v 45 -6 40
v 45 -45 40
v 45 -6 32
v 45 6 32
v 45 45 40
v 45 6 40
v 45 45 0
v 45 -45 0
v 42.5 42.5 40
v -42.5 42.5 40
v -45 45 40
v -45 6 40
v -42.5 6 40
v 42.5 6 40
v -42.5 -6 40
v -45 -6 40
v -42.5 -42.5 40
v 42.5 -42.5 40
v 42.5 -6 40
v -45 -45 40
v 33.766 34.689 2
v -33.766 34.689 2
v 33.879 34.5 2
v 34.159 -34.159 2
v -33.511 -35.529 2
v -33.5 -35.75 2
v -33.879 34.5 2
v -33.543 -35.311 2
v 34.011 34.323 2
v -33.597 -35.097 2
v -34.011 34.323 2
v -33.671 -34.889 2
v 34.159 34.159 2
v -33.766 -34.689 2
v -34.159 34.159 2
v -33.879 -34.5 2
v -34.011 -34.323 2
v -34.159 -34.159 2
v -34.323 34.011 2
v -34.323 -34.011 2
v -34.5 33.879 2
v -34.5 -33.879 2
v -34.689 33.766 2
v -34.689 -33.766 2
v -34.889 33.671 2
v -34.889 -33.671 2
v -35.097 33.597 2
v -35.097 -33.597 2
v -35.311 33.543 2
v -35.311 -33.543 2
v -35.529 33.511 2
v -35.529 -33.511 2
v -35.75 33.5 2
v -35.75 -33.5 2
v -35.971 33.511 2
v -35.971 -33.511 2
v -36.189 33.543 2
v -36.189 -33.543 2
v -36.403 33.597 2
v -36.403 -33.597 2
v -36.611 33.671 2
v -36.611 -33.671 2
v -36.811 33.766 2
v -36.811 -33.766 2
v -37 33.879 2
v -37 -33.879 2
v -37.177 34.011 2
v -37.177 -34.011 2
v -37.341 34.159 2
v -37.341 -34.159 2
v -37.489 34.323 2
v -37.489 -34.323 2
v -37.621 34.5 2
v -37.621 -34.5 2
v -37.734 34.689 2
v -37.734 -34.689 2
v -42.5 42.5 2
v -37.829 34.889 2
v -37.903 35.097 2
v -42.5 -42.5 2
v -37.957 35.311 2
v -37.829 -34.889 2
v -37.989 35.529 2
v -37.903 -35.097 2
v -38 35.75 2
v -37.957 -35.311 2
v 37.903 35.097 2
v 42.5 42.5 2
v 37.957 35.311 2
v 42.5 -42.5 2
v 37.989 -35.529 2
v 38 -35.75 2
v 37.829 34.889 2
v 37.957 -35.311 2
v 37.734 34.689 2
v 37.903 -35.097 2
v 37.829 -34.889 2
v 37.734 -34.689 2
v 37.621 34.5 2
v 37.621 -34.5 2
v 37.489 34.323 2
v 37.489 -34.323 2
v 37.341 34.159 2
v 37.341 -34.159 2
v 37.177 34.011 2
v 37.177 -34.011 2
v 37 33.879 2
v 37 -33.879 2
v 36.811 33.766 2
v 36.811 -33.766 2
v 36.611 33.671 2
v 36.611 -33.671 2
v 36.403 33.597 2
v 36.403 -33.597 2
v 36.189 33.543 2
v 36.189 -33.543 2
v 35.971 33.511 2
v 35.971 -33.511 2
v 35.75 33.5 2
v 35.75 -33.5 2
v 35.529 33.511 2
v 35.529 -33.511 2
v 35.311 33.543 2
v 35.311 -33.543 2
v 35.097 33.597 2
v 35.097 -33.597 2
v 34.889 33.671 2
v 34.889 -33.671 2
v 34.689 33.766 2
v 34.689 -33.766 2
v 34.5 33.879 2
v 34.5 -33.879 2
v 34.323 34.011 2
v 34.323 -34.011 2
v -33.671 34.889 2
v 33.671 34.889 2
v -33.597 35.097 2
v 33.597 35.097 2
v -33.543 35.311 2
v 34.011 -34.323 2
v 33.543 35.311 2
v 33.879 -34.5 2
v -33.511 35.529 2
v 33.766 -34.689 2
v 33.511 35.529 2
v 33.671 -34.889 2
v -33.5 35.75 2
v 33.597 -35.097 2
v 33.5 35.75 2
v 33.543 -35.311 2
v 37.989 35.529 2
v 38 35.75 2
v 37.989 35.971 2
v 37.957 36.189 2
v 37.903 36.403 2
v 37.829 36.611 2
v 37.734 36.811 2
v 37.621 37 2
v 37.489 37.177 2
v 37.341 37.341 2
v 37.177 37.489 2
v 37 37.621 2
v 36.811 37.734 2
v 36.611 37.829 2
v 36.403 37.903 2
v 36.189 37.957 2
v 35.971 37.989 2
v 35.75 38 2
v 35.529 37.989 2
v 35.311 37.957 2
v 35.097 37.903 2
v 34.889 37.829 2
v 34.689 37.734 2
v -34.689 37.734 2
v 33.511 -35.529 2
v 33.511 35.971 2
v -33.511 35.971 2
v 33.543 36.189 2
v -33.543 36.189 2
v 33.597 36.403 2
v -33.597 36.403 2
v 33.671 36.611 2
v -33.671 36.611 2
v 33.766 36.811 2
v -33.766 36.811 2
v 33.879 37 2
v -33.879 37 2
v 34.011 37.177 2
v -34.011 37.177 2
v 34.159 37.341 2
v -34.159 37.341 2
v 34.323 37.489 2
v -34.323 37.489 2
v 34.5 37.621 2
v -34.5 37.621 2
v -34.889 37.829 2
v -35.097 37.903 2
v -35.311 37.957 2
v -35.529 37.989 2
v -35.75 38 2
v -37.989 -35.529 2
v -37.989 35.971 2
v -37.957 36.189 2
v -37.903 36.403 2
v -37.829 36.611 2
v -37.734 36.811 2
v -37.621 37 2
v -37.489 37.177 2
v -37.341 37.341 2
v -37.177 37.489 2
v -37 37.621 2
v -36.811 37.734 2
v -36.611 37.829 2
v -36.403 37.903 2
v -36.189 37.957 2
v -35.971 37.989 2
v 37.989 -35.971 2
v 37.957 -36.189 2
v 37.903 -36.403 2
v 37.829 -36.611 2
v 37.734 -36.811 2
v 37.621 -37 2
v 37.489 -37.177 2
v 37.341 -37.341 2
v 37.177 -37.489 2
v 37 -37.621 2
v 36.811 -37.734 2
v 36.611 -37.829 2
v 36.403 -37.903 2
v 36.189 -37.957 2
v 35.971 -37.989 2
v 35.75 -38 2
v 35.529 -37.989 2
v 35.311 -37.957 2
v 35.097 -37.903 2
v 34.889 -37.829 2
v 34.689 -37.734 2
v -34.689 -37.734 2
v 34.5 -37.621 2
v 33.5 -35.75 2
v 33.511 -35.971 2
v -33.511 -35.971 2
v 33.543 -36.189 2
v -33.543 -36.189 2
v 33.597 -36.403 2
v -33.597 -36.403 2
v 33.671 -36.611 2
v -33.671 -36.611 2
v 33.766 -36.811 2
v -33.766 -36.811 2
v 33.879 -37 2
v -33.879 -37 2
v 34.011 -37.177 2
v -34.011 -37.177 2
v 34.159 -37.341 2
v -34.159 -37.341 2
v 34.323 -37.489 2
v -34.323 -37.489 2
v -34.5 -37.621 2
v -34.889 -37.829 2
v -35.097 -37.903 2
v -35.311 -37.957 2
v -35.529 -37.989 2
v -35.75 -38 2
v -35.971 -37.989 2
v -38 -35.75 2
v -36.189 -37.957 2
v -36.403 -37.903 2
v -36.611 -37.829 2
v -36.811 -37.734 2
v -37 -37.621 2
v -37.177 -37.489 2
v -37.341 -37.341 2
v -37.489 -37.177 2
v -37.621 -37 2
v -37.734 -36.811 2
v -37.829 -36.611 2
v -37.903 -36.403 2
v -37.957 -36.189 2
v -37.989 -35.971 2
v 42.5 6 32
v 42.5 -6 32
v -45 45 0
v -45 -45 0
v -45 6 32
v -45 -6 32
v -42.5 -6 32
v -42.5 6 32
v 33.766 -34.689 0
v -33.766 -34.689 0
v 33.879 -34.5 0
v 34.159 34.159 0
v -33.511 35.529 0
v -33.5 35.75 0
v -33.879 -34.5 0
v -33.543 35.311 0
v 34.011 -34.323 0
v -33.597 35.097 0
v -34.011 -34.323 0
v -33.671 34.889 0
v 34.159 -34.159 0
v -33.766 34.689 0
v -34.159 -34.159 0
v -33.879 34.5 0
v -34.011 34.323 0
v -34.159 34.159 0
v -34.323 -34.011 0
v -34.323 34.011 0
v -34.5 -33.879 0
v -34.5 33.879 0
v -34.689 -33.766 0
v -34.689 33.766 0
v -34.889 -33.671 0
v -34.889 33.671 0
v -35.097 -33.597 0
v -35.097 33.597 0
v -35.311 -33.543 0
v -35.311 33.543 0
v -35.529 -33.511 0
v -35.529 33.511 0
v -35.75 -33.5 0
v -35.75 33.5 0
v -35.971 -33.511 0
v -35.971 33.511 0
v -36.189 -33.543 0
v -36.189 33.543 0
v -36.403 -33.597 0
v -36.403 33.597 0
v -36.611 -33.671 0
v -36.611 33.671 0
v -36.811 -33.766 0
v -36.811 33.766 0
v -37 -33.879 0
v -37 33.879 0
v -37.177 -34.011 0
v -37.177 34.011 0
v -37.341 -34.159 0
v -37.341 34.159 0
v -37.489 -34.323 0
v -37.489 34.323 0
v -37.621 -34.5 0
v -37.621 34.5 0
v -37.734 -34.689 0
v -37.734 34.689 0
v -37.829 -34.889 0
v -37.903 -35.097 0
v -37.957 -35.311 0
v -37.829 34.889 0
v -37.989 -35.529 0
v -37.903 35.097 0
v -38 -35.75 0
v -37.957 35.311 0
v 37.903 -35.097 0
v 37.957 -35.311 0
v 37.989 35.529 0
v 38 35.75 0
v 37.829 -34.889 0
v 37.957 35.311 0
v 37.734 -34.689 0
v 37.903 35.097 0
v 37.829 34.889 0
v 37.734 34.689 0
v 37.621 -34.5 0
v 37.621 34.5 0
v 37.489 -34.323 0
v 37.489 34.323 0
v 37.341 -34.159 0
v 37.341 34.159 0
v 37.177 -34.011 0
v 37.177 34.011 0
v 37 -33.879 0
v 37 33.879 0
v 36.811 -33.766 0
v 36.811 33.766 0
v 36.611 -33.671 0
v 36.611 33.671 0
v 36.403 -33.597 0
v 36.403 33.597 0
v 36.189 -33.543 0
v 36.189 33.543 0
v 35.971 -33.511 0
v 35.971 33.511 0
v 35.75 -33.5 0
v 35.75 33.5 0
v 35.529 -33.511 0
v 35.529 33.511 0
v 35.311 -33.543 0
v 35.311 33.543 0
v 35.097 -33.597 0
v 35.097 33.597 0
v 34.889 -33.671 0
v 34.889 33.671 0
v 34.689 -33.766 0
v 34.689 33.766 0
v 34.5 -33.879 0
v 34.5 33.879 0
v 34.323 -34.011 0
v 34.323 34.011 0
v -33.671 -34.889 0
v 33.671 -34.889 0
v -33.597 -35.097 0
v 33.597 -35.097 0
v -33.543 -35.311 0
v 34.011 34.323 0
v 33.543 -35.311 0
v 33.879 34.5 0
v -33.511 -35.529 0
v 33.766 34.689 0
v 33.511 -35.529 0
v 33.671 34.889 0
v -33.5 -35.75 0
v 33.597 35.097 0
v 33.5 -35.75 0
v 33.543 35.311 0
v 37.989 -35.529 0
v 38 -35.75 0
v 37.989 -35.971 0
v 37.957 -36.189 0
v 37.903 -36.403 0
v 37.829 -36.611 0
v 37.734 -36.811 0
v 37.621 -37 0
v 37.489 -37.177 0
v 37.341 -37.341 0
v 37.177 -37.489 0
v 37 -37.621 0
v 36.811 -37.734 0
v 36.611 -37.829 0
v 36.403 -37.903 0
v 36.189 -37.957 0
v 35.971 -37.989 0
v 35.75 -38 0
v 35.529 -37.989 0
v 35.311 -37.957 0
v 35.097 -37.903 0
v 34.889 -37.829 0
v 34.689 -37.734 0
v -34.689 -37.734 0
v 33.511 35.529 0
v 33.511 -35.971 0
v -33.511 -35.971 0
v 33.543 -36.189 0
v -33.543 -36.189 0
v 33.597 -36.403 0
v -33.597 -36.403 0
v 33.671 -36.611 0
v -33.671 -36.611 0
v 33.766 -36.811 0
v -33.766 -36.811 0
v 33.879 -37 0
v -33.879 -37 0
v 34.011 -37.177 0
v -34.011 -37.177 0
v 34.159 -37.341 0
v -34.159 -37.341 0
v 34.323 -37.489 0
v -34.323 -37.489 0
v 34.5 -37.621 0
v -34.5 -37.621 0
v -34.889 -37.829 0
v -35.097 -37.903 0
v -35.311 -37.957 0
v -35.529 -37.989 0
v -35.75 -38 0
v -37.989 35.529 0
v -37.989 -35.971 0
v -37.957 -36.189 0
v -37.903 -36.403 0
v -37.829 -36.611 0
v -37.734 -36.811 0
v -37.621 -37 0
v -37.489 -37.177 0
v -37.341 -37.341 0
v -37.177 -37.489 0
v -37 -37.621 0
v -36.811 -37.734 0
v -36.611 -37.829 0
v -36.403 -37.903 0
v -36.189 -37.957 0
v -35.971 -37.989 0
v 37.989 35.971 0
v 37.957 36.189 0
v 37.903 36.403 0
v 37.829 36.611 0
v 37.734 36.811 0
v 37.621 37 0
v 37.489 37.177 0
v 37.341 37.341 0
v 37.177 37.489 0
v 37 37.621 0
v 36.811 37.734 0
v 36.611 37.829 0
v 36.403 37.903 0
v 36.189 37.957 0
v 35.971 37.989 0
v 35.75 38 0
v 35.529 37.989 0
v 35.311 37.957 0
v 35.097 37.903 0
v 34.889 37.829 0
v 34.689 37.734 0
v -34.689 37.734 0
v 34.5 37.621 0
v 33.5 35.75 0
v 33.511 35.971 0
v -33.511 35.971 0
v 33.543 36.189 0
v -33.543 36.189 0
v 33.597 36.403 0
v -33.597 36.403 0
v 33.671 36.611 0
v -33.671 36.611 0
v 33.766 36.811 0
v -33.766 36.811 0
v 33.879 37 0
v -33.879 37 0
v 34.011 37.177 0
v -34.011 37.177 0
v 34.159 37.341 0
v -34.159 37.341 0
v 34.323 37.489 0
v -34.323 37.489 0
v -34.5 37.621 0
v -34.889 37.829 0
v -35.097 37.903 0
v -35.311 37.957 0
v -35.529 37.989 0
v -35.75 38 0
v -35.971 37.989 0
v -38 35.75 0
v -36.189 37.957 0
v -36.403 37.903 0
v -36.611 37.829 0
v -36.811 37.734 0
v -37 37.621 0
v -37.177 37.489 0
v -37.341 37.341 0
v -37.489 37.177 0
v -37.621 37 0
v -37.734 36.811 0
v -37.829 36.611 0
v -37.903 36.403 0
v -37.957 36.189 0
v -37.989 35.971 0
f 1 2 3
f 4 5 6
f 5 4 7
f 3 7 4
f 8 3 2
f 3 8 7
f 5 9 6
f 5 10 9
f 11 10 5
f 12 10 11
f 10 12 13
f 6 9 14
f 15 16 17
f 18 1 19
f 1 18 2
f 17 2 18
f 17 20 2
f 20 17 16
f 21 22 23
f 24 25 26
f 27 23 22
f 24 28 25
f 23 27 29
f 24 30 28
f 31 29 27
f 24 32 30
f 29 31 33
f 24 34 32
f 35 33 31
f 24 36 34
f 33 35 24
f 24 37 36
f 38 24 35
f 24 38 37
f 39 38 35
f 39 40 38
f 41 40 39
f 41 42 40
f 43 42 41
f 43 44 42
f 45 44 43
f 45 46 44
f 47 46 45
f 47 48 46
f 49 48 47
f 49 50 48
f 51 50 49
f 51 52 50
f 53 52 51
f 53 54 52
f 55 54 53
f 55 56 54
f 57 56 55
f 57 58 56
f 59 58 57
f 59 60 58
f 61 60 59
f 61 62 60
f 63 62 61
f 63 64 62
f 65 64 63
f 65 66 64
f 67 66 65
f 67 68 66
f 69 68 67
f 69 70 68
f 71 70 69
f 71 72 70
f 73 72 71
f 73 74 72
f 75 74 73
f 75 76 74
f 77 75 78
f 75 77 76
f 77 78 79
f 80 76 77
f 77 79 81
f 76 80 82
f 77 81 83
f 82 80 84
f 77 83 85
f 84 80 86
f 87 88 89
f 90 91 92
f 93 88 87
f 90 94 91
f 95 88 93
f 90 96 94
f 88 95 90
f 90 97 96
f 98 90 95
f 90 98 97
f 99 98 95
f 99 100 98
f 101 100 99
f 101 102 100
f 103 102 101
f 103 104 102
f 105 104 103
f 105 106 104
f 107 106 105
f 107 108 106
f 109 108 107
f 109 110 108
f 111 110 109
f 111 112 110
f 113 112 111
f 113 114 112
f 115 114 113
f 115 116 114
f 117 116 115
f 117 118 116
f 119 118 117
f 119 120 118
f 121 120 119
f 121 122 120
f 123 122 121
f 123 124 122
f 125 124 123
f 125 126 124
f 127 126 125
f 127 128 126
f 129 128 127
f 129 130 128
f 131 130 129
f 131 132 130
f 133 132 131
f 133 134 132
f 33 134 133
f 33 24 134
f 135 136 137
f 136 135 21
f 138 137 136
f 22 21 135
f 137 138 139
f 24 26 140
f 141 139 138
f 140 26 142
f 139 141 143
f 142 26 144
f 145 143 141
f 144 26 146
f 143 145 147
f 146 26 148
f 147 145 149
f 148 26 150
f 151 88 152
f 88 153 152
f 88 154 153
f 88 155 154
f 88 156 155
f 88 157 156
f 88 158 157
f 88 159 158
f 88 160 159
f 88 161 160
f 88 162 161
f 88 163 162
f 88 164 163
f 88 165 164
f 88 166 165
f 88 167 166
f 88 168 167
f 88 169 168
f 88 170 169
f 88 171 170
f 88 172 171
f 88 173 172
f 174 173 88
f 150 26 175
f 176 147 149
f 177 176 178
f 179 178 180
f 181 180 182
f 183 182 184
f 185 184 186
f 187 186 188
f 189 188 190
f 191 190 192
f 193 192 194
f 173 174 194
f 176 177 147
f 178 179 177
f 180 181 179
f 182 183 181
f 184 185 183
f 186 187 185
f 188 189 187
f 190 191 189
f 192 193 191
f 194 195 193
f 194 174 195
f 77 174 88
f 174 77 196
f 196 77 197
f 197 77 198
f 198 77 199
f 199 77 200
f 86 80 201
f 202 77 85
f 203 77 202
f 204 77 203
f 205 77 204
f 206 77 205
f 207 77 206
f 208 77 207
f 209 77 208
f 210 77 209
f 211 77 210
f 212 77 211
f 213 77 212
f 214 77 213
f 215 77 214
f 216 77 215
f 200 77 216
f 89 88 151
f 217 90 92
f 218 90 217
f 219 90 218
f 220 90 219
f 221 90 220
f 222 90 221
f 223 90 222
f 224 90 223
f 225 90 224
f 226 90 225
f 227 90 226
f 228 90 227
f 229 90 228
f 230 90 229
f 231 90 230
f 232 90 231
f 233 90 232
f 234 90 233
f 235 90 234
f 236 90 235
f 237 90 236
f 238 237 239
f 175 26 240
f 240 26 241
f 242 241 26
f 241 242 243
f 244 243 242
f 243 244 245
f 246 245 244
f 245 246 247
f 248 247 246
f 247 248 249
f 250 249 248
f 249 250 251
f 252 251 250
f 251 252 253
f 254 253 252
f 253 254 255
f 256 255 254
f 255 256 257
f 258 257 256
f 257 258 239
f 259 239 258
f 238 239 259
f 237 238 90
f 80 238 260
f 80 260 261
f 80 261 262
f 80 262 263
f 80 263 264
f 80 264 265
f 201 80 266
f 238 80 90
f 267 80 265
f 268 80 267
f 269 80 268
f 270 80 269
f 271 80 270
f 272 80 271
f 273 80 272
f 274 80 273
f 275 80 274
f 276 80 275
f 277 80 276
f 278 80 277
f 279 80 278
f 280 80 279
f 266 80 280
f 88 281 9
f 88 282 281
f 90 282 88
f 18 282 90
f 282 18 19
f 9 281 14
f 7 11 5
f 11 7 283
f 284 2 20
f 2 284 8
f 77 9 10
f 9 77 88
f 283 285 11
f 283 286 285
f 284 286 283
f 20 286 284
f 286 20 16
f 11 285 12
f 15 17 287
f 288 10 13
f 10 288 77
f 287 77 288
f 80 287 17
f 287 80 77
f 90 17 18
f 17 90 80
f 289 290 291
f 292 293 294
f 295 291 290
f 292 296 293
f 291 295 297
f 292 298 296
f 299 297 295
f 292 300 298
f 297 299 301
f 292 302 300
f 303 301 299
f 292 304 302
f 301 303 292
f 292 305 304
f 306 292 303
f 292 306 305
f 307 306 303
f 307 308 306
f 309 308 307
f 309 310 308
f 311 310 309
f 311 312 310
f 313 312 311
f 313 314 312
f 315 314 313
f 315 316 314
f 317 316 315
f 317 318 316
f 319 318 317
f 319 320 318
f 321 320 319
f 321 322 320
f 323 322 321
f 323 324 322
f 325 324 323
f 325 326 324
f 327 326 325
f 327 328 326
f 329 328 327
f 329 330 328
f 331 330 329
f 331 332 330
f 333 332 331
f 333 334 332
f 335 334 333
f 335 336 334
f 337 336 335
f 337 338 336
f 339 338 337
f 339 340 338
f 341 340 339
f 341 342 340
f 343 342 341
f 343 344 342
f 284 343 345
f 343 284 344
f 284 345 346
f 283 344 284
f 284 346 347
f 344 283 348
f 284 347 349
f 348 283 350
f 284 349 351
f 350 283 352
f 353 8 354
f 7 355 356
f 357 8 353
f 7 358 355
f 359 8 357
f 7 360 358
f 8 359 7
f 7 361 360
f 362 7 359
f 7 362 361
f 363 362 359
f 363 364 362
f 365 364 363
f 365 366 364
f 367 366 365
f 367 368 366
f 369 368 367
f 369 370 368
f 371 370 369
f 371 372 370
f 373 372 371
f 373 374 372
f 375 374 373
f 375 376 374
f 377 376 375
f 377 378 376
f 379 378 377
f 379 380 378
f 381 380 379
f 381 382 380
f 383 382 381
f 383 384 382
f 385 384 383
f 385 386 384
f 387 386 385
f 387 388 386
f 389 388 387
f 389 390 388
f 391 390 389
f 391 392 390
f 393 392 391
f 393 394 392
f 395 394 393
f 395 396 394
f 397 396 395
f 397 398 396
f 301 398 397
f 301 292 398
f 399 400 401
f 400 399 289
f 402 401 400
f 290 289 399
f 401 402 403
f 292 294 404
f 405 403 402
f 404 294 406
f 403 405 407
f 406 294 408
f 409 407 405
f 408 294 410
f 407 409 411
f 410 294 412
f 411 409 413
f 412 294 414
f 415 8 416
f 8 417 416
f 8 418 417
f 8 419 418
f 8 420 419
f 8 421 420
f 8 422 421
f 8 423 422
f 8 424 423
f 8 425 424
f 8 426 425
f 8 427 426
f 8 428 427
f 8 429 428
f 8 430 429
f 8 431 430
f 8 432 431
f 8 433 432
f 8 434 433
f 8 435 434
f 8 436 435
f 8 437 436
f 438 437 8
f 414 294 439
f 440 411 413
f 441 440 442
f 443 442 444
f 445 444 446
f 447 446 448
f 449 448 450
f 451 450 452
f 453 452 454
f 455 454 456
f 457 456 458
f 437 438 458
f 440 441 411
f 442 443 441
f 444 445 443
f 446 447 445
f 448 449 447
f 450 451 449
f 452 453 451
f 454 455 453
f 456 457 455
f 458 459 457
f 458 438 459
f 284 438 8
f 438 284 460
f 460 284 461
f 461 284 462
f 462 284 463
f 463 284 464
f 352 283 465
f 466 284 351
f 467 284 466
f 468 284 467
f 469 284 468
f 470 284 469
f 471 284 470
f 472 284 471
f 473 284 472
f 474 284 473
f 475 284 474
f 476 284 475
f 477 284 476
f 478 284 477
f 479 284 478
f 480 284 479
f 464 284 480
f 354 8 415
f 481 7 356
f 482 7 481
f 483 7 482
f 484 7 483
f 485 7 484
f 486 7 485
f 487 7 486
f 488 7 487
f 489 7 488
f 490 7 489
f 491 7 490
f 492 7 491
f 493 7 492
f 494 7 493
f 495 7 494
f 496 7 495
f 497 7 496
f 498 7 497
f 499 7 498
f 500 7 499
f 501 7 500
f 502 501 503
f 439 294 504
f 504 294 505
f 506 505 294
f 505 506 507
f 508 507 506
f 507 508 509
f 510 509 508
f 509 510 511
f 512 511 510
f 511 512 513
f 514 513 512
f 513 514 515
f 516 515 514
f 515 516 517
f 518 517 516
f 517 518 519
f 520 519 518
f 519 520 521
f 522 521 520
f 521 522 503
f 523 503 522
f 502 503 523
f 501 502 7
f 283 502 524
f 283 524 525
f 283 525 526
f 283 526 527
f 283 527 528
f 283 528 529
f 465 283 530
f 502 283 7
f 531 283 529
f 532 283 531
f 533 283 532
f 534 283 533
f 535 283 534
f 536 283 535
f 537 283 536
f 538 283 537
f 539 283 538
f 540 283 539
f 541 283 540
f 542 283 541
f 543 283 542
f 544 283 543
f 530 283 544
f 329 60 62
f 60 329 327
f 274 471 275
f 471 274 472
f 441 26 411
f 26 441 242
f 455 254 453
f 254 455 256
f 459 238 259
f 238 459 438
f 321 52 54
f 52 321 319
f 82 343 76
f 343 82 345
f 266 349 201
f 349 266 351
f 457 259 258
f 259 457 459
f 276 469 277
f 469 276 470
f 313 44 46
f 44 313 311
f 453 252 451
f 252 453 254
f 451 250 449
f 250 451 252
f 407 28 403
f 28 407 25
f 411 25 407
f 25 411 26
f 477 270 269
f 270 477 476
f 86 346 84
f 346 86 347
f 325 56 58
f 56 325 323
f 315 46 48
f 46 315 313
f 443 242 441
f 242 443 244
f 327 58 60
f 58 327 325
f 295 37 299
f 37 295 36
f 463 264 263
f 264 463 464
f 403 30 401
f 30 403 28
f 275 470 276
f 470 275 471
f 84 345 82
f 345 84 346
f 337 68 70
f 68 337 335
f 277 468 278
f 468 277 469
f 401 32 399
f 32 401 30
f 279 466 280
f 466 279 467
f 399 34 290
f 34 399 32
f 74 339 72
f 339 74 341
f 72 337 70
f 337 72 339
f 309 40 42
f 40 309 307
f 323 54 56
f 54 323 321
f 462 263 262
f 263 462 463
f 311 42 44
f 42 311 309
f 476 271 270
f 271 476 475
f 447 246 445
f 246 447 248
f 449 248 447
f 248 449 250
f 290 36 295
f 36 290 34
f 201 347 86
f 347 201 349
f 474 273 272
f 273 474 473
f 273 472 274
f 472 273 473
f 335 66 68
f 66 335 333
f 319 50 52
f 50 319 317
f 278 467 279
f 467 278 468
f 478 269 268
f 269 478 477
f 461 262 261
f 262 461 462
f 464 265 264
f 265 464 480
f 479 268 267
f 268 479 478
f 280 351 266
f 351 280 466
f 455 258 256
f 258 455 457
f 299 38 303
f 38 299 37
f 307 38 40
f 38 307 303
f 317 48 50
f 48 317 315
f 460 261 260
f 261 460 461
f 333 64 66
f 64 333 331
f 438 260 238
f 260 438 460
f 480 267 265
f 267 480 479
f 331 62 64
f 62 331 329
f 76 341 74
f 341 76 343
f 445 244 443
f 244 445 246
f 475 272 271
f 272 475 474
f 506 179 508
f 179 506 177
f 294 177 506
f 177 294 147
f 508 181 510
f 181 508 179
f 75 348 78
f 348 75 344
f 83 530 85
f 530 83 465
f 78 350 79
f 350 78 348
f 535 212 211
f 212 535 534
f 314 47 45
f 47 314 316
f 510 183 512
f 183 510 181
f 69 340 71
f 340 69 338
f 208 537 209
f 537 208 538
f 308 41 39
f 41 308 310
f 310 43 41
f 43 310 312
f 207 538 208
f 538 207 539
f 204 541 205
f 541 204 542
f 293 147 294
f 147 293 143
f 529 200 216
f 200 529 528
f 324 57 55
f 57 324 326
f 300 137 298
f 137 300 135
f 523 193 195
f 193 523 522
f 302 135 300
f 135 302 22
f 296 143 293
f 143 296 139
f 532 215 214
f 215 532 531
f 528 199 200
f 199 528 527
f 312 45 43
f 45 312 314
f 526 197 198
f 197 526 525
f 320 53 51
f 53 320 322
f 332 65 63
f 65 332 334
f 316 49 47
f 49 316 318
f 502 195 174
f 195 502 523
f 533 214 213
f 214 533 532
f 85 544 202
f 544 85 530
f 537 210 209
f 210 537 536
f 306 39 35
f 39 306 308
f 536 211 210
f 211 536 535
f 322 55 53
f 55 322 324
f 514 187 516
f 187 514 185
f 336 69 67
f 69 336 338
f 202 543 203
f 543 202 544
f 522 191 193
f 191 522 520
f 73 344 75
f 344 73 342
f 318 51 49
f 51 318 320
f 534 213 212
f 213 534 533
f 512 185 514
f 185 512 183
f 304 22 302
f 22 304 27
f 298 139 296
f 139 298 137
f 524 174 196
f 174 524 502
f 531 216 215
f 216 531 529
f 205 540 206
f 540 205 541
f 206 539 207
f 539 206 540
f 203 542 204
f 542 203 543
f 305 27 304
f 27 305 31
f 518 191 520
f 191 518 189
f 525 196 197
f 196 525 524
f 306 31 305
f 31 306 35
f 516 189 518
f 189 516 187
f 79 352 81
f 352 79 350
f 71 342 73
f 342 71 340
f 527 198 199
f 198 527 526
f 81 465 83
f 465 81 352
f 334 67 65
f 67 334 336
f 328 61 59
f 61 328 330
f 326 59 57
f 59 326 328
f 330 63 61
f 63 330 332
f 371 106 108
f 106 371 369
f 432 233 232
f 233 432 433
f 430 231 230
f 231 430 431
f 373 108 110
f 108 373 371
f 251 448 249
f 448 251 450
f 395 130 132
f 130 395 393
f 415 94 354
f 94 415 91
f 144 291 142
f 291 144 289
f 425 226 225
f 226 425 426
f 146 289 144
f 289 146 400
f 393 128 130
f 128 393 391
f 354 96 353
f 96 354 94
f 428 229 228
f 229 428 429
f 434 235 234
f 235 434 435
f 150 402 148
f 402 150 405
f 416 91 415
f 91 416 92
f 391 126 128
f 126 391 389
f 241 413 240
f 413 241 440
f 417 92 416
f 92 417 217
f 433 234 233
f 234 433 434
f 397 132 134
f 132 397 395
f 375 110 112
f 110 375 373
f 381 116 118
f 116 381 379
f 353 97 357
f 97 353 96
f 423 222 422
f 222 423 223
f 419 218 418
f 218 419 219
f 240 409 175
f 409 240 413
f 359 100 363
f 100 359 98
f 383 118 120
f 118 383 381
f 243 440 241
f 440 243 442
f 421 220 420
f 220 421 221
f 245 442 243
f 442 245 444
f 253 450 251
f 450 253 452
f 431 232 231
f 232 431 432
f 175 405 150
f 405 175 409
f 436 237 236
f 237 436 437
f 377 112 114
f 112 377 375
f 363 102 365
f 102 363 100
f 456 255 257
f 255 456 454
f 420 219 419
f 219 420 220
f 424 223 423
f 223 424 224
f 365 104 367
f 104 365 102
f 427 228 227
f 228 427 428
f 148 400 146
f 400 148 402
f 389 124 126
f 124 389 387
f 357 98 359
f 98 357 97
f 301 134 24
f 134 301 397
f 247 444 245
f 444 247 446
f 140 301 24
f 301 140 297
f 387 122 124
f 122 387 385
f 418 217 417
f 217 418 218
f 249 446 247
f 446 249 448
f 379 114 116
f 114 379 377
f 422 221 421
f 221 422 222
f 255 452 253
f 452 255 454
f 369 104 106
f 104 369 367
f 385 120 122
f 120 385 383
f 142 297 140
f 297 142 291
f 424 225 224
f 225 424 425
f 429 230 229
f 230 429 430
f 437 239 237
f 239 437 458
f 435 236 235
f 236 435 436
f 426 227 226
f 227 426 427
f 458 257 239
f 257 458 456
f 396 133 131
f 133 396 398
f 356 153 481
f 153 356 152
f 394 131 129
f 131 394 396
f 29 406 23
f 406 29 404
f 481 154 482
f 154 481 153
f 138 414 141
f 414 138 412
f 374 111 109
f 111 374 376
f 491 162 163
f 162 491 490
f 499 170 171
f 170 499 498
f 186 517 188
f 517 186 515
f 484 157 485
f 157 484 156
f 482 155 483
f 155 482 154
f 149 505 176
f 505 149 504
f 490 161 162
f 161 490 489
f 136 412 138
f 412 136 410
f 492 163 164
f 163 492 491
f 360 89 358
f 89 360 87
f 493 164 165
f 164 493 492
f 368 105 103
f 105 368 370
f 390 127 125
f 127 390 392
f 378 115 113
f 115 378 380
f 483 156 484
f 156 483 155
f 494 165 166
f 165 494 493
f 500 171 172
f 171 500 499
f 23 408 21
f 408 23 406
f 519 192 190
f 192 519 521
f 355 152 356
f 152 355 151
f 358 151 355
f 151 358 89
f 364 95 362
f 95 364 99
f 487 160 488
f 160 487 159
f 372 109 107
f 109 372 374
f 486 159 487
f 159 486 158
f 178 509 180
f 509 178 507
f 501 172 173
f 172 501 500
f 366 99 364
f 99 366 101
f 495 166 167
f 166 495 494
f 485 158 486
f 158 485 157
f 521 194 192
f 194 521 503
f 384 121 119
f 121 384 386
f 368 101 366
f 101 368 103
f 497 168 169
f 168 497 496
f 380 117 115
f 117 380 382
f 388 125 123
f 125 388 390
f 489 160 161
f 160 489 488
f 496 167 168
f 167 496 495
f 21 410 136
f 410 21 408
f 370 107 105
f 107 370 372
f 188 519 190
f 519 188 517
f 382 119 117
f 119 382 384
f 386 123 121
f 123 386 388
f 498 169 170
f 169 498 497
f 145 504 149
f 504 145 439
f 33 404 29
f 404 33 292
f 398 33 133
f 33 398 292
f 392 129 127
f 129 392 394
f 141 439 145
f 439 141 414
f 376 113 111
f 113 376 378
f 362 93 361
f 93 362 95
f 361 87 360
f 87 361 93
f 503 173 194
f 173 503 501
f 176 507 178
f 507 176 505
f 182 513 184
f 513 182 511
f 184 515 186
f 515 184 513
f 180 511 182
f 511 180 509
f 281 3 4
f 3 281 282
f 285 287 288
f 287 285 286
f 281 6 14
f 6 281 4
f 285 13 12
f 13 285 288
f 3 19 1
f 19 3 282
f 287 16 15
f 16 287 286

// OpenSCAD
// Magnetic stirrer housing for 80 mm PC case fan
// Print orientation: top plate on bed (z = 0), walls rise to open top (z = 40)

// ---------- Parameters ----------
plate_t      = 2;     // top plate thickness
wall_t       = 2.5;   // wall thickness
open_top_z   = 40;    // height of open top
outer_size   = 90;    // outer X/Y size of box
screw_hole   = 4.5;   // M4 screw hole diameter
screw_pitch  = 71.5;  // square pattern size for screw holes
cable_notch  = 12;    // cable notch width
cable_reach  = 8;     // cable notch depth from open edge
eps          = 0.5;   // cutter overshoot past faces

$fn = 64;

// ---------- Model ----------
difference() {
    // Main box body
    union() {
        // Top plate
        translate([-outer_size/2, -outer_size/2, 0])
            cube([outer_size, outer_size, plate_t]);
        // Walls
        for (a = [0, 90, 180, 270])
            rotate([0, 0, a])
                translate([outer_size/2 - wall_t, -outer_size/2, plate_t])
                    cube([wall_t, outer_size, open_top_z - plate_t]);
    }

    // Screw holes through top plate
    for (x = [-screw_pitch/2, screw_pitch/2])
        for (y = [-screw_pitch/2, screw_pitch/2])
            translate([x, y, -eps])
                cylinder(d = screw_hole, h = plate_t + 2*eps);

    // Cable notch in one wall (centred along Y, from z = 32 to z = 40)
    translate([-outer_size/2, -cable_notch/2, open_top_z - cable_reach])
        cube([outer_size, cable_notch, cable_reach + eps]);
}
